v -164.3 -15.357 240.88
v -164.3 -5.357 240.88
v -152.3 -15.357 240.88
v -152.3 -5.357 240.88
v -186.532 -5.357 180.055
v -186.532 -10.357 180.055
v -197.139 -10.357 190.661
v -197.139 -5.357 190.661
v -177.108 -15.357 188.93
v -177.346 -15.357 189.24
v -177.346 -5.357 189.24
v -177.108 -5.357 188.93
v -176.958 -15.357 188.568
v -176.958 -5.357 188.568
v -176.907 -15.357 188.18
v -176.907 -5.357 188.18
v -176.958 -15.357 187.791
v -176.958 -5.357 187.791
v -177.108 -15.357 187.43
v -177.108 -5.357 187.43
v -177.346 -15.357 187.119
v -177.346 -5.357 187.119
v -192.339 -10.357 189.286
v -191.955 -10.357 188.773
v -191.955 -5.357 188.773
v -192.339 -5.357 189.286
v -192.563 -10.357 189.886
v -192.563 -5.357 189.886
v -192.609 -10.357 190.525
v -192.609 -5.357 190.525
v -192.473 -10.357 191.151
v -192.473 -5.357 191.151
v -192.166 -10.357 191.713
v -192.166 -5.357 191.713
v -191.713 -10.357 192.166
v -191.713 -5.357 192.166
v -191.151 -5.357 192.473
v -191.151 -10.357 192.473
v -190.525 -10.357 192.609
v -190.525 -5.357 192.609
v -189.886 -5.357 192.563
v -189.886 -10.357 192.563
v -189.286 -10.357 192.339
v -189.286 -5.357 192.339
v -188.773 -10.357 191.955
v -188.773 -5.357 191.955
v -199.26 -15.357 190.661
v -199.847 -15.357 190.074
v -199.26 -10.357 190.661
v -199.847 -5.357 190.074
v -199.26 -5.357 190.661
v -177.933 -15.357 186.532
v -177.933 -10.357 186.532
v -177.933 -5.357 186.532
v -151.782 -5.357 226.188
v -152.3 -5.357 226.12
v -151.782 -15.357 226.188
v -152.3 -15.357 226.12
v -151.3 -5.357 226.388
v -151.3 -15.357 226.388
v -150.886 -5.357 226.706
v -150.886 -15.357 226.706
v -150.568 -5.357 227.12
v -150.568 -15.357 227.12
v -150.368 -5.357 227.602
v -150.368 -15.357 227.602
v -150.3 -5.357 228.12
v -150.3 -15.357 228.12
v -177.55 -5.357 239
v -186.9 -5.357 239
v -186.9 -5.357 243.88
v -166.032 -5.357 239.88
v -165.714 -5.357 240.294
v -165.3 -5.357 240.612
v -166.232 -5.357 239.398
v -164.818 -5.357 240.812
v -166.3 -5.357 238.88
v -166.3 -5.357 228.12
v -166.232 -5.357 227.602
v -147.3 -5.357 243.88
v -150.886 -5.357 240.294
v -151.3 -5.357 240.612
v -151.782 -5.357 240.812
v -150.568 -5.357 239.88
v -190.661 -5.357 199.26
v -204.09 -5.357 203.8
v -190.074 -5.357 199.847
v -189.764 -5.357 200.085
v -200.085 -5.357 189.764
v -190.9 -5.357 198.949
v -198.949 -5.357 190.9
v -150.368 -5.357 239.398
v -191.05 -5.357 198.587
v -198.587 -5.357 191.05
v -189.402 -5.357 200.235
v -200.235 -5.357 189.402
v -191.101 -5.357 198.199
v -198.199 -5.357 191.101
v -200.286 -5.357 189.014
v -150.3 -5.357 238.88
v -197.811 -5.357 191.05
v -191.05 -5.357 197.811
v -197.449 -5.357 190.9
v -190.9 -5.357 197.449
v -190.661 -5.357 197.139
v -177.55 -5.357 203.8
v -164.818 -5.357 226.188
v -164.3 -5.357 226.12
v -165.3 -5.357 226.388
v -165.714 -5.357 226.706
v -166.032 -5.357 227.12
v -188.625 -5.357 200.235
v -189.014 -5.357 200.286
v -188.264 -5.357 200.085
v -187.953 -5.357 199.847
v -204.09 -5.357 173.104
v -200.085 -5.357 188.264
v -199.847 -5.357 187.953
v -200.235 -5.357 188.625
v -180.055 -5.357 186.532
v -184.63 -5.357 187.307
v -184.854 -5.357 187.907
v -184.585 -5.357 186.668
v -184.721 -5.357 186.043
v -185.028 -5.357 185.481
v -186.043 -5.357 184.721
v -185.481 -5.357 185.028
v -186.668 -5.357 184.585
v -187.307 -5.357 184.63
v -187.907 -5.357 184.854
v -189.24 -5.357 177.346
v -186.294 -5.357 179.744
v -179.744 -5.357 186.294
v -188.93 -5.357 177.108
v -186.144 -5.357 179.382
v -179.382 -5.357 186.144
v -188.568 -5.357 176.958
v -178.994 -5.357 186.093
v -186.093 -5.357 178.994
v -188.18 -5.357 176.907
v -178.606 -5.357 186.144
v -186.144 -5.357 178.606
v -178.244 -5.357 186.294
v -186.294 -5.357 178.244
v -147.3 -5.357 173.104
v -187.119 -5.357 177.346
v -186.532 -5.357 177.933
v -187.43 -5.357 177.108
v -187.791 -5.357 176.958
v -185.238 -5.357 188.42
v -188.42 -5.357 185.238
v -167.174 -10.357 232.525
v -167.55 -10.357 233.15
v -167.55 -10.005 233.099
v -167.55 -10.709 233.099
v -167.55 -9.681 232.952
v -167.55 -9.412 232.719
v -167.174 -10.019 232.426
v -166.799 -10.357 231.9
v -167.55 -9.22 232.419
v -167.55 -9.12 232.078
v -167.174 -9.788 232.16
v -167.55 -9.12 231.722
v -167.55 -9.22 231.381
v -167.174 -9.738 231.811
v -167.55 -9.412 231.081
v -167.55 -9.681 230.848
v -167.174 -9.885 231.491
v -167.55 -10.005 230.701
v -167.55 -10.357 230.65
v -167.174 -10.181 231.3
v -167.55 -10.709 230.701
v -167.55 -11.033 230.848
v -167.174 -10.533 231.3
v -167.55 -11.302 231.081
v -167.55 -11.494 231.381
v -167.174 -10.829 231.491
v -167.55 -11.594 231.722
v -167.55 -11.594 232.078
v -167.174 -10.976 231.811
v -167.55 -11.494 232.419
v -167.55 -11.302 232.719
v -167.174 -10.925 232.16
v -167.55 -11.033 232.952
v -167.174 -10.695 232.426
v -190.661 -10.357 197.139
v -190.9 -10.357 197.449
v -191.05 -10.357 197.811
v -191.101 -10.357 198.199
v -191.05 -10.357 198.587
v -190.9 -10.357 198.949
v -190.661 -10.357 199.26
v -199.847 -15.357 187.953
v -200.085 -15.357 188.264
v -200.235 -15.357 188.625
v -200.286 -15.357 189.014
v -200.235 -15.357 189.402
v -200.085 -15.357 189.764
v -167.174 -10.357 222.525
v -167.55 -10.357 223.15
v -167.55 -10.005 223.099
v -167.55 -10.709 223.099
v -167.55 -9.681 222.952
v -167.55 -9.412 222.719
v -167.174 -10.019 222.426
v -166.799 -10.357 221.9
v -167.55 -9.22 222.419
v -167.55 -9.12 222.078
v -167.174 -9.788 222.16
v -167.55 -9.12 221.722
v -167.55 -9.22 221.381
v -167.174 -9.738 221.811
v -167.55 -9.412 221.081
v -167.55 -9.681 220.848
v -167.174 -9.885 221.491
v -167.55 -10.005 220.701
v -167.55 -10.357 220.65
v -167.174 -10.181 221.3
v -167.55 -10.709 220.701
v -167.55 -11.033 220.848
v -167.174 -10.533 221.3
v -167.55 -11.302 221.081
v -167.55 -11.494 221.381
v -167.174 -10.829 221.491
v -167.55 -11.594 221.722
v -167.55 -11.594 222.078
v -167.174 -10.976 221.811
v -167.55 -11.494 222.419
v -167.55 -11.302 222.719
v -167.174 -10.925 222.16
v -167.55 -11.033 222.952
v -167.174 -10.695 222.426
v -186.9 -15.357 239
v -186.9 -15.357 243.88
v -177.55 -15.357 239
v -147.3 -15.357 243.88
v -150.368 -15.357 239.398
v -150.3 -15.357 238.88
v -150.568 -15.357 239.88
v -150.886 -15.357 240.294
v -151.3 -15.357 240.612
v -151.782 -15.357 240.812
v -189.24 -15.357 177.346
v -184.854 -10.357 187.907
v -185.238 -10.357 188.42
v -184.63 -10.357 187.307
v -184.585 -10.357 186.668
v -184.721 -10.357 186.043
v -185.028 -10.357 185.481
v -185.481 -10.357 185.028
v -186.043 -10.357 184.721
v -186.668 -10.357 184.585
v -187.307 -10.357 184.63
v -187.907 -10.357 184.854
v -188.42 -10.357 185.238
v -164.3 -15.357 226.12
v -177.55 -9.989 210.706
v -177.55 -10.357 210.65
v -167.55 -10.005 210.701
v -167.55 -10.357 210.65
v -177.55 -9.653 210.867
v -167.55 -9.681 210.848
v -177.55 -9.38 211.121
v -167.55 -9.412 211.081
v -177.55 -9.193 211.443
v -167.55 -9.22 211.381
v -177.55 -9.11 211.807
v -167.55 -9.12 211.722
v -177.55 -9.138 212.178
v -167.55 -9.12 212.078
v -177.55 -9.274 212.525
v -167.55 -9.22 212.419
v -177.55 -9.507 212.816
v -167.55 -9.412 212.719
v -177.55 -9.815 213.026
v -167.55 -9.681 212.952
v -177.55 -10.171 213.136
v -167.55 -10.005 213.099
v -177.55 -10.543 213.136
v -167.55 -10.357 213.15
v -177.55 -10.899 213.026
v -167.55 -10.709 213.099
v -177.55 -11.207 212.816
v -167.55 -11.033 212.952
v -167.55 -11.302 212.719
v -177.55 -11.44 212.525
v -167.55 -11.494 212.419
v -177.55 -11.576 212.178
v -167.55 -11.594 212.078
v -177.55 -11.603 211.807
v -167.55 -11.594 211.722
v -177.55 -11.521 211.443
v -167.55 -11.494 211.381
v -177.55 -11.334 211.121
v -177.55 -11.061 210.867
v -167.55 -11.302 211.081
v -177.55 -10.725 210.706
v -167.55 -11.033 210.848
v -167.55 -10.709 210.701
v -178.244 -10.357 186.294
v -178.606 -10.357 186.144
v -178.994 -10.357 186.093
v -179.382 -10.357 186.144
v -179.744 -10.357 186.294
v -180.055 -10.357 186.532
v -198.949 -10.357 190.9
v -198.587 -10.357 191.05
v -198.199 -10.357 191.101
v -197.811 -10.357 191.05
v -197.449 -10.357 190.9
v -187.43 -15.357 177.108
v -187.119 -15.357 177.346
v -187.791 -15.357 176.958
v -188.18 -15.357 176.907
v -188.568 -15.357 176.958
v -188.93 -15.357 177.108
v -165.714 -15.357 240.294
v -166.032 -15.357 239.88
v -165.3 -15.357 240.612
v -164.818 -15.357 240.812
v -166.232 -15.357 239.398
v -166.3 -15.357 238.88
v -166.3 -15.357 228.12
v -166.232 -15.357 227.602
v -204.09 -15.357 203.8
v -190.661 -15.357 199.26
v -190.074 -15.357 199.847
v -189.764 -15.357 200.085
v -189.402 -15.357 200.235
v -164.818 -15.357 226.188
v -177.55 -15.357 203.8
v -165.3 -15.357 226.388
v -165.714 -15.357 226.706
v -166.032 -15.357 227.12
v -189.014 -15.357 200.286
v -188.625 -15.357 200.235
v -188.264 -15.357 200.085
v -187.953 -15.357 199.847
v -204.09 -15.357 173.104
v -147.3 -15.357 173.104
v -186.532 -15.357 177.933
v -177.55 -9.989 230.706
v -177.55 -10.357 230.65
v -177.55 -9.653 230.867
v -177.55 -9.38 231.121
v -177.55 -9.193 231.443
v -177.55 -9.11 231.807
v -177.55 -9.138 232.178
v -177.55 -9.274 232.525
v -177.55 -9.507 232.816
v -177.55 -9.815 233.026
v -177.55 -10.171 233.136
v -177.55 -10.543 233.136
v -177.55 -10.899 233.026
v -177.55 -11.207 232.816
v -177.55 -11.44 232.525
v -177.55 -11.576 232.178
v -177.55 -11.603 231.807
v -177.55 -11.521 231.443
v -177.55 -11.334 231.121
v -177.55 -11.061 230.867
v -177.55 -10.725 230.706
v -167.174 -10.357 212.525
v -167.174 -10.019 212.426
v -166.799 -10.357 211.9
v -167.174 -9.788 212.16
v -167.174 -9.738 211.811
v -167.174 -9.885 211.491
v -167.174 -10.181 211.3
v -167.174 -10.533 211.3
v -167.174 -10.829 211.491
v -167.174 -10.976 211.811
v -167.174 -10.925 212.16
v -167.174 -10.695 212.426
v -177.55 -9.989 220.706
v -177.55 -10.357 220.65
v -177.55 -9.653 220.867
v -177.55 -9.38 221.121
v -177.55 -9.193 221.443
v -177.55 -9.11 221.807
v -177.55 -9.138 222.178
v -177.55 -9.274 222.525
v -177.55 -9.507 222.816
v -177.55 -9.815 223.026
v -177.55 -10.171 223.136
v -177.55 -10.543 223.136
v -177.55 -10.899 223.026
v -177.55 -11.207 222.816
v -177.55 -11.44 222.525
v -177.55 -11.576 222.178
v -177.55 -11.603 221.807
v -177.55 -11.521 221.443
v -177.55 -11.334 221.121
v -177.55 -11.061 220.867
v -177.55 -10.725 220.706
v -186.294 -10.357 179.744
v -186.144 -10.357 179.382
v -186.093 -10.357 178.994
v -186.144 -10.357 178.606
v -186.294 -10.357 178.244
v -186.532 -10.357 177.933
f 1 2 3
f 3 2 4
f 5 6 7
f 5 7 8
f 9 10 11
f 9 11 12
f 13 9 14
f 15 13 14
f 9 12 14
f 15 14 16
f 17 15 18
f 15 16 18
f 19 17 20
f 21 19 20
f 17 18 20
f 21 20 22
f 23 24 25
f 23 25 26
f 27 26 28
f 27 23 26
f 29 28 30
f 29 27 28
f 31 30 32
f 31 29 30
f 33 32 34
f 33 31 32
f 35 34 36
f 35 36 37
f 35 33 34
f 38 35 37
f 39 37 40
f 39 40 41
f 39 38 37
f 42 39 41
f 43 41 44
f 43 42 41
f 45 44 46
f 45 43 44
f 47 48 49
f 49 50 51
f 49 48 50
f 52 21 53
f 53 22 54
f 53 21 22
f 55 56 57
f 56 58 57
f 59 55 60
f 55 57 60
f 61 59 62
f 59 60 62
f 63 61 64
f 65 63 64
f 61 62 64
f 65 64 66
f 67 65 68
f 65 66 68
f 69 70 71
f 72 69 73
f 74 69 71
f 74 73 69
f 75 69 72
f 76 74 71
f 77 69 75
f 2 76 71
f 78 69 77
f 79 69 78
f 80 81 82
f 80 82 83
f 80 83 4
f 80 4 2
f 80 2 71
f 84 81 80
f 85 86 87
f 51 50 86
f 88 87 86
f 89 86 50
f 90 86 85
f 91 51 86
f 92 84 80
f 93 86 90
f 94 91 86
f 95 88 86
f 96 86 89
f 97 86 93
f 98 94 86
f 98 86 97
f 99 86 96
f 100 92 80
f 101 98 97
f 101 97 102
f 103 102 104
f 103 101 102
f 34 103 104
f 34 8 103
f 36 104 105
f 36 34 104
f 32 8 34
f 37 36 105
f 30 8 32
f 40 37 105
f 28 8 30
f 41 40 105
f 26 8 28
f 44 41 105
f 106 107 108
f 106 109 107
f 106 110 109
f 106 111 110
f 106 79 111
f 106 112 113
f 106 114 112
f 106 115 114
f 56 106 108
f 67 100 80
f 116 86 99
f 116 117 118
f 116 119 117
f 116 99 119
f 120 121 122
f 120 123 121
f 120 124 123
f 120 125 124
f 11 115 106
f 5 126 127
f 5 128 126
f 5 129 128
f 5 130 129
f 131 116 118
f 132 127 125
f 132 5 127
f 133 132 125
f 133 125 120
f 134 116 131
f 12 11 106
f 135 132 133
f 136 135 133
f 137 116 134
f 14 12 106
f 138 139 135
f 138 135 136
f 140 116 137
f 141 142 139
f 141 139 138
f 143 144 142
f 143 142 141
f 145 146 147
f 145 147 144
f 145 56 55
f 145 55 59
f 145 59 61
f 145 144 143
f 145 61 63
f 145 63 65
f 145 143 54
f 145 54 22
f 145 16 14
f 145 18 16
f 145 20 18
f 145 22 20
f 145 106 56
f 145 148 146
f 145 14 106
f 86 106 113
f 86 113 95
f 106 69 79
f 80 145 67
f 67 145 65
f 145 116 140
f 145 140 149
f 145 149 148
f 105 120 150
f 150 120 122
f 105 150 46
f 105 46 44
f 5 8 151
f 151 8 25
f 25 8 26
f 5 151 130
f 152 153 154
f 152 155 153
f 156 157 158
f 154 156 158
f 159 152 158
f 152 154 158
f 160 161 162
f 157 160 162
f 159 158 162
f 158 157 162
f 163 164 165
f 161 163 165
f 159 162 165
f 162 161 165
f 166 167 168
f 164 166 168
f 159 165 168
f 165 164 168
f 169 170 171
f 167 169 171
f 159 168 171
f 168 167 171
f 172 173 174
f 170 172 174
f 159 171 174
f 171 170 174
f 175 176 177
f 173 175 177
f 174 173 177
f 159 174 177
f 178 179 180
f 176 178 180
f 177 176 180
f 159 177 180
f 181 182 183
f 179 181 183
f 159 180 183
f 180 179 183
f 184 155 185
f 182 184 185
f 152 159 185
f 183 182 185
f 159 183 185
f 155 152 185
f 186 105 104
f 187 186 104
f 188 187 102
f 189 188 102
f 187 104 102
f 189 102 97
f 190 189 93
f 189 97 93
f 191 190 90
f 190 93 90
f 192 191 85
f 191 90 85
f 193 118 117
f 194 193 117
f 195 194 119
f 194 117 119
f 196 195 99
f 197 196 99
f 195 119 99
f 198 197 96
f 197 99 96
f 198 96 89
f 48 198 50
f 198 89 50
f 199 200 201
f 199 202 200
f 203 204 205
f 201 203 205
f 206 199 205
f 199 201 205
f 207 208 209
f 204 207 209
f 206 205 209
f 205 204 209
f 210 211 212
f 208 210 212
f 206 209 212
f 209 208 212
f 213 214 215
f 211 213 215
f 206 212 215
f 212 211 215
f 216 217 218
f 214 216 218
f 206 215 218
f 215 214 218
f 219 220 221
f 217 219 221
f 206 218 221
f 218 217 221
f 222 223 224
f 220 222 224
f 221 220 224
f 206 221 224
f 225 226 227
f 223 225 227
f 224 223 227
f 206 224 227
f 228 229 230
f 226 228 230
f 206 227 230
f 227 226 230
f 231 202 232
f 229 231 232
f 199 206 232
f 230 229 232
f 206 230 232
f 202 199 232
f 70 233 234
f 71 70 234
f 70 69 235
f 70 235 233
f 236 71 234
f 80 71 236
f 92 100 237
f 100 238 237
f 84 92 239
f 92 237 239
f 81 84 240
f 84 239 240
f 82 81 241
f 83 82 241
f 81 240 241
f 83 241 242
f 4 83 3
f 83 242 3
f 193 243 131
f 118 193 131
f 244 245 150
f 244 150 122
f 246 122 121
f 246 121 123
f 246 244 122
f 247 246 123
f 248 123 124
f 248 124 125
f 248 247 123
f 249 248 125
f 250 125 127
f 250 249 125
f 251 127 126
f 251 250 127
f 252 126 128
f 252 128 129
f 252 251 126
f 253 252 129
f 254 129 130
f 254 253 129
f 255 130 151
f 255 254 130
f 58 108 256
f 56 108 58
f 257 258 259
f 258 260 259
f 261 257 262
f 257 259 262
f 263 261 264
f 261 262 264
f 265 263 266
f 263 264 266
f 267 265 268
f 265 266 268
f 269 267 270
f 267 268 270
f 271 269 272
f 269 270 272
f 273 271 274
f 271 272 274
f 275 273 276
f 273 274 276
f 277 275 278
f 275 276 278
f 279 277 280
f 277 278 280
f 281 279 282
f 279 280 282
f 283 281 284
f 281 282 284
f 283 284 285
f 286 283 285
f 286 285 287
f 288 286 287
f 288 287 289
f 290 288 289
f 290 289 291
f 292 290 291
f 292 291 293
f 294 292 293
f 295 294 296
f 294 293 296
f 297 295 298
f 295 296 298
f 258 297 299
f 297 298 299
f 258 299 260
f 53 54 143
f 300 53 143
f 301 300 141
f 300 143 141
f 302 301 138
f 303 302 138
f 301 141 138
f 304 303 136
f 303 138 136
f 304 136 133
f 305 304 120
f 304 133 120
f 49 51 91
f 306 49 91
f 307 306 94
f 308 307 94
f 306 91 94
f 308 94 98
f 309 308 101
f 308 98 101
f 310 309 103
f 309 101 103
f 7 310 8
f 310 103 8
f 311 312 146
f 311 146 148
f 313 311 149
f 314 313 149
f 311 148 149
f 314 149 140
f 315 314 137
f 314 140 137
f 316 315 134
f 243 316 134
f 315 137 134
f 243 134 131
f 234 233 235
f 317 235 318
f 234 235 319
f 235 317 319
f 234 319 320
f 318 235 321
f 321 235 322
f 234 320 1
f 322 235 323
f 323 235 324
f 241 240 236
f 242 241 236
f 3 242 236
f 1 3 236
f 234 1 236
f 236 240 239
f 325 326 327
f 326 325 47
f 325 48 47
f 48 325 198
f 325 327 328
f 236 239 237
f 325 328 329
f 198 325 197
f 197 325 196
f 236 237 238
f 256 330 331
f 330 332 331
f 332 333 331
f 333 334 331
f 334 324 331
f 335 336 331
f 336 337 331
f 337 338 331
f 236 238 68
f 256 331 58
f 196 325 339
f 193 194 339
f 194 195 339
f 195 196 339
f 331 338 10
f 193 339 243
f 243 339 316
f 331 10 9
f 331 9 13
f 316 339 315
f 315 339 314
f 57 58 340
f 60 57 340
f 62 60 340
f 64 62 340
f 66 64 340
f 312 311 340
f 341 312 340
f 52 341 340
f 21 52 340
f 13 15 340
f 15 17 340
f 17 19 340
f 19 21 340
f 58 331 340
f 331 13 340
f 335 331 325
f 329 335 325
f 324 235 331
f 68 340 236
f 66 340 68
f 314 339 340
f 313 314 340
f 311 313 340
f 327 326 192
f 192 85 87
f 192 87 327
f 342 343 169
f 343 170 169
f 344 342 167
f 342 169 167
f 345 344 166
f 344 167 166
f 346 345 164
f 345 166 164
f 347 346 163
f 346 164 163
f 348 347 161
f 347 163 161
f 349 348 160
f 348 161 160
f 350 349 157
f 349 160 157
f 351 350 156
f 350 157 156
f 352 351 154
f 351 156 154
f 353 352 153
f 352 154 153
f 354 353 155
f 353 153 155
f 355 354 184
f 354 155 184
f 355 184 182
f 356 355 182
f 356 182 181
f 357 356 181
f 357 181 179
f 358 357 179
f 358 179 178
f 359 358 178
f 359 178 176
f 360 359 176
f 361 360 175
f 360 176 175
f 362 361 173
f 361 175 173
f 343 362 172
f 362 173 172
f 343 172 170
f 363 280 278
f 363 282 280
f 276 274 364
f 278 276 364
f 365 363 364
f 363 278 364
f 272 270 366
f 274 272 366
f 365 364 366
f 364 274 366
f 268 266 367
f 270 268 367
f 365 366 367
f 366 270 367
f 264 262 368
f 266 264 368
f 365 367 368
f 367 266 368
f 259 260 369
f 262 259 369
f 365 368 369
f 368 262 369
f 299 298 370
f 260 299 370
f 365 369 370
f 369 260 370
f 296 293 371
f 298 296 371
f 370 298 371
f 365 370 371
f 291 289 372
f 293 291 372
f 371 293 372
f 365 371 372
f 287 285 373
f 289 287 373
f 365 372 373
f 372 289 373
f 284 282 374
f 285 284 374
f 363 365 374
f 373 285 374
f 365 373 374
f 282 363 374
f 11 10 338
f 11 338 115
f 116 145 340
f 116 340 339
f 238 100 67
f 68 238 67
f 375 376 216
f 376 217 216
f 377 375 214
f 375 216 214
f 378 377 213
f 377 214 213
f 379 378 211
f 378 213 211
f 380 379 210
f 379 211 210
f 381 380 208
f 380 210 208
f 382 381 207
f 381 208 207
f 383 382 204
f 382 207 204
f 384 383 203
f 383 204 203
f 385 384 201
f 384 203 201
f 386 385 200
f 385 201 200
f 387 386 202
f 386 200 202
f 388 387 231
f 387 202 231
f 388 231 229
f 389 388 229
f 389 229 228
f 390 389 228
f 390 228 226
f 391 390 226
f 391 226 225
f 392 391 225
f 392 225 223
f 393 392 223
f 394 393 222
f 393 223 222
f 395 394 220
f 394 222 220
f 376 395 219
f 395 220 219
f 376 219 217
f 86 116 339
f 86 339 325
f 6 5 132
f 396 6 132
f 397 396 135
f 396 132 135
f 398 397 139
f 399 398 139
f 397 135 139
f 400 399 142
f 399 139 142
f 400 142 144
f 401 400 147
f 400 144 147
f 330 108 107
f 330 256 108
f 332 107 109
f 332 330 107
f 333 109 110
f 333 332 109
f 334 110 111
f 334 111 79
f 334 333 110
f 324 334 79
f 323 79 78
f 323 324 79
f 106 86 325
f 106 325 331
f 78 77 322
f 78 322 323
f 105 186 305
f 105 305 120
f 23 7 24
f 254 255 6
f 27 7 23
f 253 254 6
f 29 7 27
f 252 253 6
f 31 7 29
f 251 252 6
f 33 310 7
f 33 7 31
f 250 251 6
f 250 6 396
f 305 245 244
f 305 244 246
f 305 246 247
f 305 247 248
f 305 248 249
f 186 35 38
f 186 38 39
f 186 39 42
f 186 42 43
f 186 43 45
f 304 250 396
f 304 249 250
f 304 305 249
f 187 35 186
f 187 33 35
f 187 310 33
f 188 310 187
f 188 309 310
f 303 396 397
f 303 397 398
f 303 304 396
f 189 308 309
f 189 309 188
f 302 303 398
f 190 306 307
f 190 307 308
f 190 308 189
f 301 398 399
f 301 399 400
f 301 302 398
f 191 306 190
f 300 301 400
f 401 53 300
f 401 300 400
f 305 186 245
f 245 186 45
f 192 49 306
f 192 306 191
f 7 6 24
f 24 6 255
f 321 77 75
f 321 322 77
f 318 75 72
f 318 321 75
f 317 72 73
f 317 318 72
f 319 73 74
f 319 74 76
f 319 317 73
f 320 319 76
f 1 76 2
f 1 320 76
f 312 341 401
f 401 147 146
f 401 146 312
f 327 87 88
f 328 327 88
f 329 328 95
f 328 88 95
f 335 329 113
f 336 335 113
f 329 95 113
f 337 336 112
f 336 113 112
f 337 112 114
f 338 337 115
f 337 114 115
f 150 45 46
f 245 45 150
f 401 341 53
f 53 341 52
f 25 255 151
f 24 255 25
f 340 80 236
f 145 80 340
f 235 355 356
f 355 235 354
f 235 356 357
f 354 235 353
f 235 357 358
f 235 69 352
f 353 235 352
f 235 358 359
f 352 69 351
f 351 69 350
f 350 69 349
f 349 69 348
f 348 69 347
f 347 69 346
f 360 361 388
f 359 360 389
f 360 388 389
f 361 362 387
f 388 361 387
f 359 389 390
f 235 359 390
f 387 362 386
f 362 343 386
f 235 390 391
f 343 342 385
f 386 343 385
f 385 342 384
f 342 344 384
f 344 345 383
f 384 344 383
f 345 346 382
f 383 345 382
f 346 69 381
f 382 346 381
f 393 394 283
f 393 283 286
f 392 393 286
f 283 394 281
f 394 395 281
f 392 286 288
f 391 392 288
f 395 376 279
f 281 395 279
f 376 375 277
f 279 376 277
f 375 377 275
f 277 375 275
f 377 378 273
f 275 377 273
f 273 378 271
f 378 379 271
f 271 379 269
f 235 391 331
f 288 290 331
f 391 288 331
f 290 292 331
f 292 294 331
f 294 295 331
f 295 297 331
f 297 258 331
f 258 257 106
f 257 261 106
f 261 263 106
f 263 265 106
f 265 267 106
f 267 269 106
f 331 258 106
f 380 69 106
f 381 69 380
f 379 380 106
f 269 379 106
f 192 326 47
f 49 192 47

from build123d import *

# Parameters (mm, degrees)
SKETCH3_W                       = 3
SKETCH3_H                       = 10
BOSS_EXTRUDE1_DEPTH             = 15
SKETCH3_W_2                     = 9.160158842
BOSS_EXTRUDE1_2_DEPTH           = 15
BOSS_EXTRUDE1_3_DEPTH           = 15
SKETCH4_W                       = 22.820603272
SKETCH4_H                       = 10
BOSS_EXTRUDE2_DEPTH             = 3
SKETCH5_W                       = 22.820603272
SKETCH5_H                       = 10
BOSS_EXTRUDE3_DEPTH             = 3
SKETCH7_W                       = 16
SKETCH7_H                       = 14.76
BOSS_EXTRUDE4_DEPTH             = 10
SKETCH8_W                       = 6.35
SKETCH8_H                       = 35.2
CUT_EXTRUDE1_DEPTH              = 10
TAP_DRILL_FOR_M3X0_5_TAP1_D     = 2.5
TAP_DRILL_FOR_M3X0_5_TAP1_DEPTH = 10
TAP_DRILL_FOR_M3X0_5_TAP1_TIP   = 0.751075774
BOSS_EXTRUDE5_DEPTH             = 10
CUT_EXTRUDE4_DEPTH              = 319.166667347
CUT_EXTRUDE5_DEPTH              = 5
M4_START                        = -10.356969024
M4_CLEARANCE_SLOT1_DEPTH        = 5
FILLET4_R                       = 2


# Read off the part's stored shape, not the designer's step: M4 Clearance Slot1
with BuildPart() as part:
    # Sketch3 → Boss-Extrude1 (new body)
    with BuildSketch(Plane(origin=(-193.9, 0, 193.9), x_dir=(0.7071067811865475, 0, 0.7071067811865477), z_dir=(-0.7071067811865477, 0, 0.7071067811865475))):
        with Locations((-9.910301636, -10.356969024)):
            Rectangle(SKETCH3_W, SKETCH3_H)
    extrude(amount=-BOSS_EXTRUDE1_DEPTH)



with BuildPart() as body_2:
    # Sketch3 → Boss-Extrude1 2 (new body)
    with BuildSketch(Plane(origin=(-193.9, 0, 193.9), x_dir=(0.7071067811865475, 0, 0.7071067811865477), z_dir=(-0.7071067811865477, 0, 0.7071067811865475))):
        with Locations((0, -10.356969024)):
            Rectangle(SKETCH3_W_2, SKETCH3_H)
    extrude(amount=-BOSS_EXTRUDE1_2_DEPTH)


with BuildPart() as body_3:
    # Sketch3 → Boss-Extrude1 3 (new body)
    with BuildSketch(Plane(origin=(-193.9, 0, 193.9), x_dir=(0.7071067811865475, 0, 0.7071067811865477), z_dir=(-0.7071067811865477, 0, 0.7071067811865475))):
        with Locations((9.910301636, -10.356969024)):
            Rectangle(SKETCH3_W, SKETCH3_H)
    extrude(amount=-BOSS_EXTRUDE1_3_DEPTH)


with BuildPart() as part_1:
    add(part.part)

    add(body_2.part)  # Boss-Extrude2 merges body 2

    add(body_3.part)  # Boss-Extrude2 merges body 3
    # Sketch4 → Boss-Extrude2 (add)
    with BuildSketch(Plane(origin=(-193.9, 0, 193.9), x_dir=(0.7071067811865472, 0, 0.7071067811865479), z_dir=(-0.7071067811865479, 0, 0.7071067811865472))):
        with Locations((0, -10.356969024)):
            Rectangle(SKETCH4_W, SKETCH4_H)
    extrude(amount=BOSS_EXTRUDE2_DEPTH)

    # Sketch5 → Boss-Extrude3 (add)
    with BuildSketch(Plane(origin=(-183.293398282, 0, 183.293398282), x_dir=(-0.7071067811865472, 0, -0.7071067811865479), z_dir=(0.7071067811865479, 0, -0.7071067811865472))):
        with Locations((0, -10.356969024)):
            Rectangle(SKETCH5_W, SKETCH5_H)
    extrude(amount=BOSS_EXTRUDE3_DEPTH)

    # Sketch7 → Boss-Extrude4 (add)
    # profile 1 of 2: a face of its own
    with BuildSketch(Plane(origin=(0, -5.356969024, 0), x_dir=(1, 0, 0), z_dir=(0, 1, 0))):
        Polygon((-204.089622006, -203.8), (-188.242640687, -203.8), (-204.089622006, -187.953018681), align=None)
    # profile 2 of 2: a face of its own
    with BuildSketch(Plane(origin=(0, -5.356969024, 0), x_dir=(1, 0, 0), z_dir=(0, 1, 0))):
        Polygon((-183.9, -239), (-186.9, -239), (-186.9, -243.88), (-147.3, -243.88), (-147.3, -173.103776276), (-189.240379601, -173.103776276), (-173.103776276, -189.240379601), (-187.663396675, -203.8), (-183.9, -203.8), align=None)
        with Locations((-158.3, -233.5)):
            Rectangle(SKETCH7_W, SKETCH7_H, mode=Mode.SUBTRACT)
    extrude(amount=-BOSS_EXTRUDE4_DEPTH)

    # Sketch8 → Cut-Extrude1 (cut)
    with BuildSketch(Plane(origin=(0, -5.356969024, 0), x_dir=(1, 0, 0), z_dir=(0, 1, 0))):
        Polygon((-188.242640687, -203.8), (-187.953018681, -204.089622006), (-187.663396675, -203.8), align=None)
        with Locations((-180.725, -221.4)):
            Rectangle(SKETCH8_W, SKETCH8_H)
    extrude(amount=-CUT_EXTRUDE1_DEPTH, mode=Mode.SUBTRACT)

    # Tap Drill for M3x0.5 Tap1
    with Locations(Plane.ZY.offset(177.55)):
        with Locations((211.9, -10.356969024), (231.9, -10.356969024), (221.9, -10.356969024)):
            Hole(TAP_DRILL_FOR_M3X0_5_TAP1_D / 2, depth=TAP_DRILL_FOR_M3X0_5_TAP1_DEPTH)
            with Locations((0, 0, -(TAP_DRILL_FOR_M3X0_5_TAP1_DEPTH + TAP_DRILL_FOR_M3X0_5_TAP1_TIP / 2))):  # 118° drill point
                Cone(0, TAP_DRILL_FOR_M3X0_5_TAP1_D / 2, TAP_DRILL_FOR_M3X0_5_TAP1_TIP, mode=Mode.SUBTRACT)

    # Sketch13 → Boss-Extrude5 (add)
    with BuildSketch(Plane(origin=(0, -5.356969024, 0), x_dir=(1, 0, 0), z_dir=(0, 1, 0))):
        Polygon((-204.089622006, -173.103776276), (-204.089622006, -187.953018681), (-189.240379601, -173.103776276), align=None)
    extrude(amount=-BOSS_EXTRUDE5_DEPTH)

    # Sketch15 → Cut-Extrude4 (cut, through all)
    with BuildSketch(Plane(origin=(0, -5.356969024, 0), x_dir=(1, 0, 0), z_dir=(0, 1, 0))):
        with BuildLine():
            Line((-186.532003499, -177.933472722), (-187.119059257, -177.346416963))
            ThreePointArc((-187.119059257, -177.346416963), (-188.179719429, -176.907077135), (-189.240379601, -177.346416963))
            Line((-189.240379601, -177.346416963), (-199.846981319, -187.953018681))
            ThreePointArc((-199.846981319, -187.953018681), (-200.286321147, -189.013678853), (-199.846981319, -190.074339025))
            Line((-199.846981319, -190.074339025), (-199.25992556, -190.661394783))
            ThreePointArc((-199.25992556, -190.661394783), (-198.199265388, -191.100734612), (-197.138605217, -190.661394783))
            Line((-197.138605217, -190.661394783), (-186.532003499, -180.054793066))
            ThreePointArc((-186.532003499, -180.054793066), (-186.092663671, -178.994132894), (-186.532003499, -177.933472722))
        make_face()
        with BuildLine():
            Line((-177.346416963, -187.119059257), (-177.933472722, -186.532003499))
            ThreePointArc((-177.933472722, -186.532003499), (-178.994132894, -186.092663671), (-180.054793066, -186.532003499))
            Line((-180.054793066, -186.532003499), (-190.661394783, -197.138605217))
            ThreePointArc((-190.661394783, -197.138605217), (-191.100734612, -198.199265388), (-190.661394783, -199.25992556))
            Line((-190.661394783, -199.25992556), (-190.074339025, -199.846981319))
            ThreePointArc((-190.074339025, -199.846981319), (-189.013678853, -200.286321147), (-187.953018681, -199.846981319))
            Line((-187.953018681, -199.846981319), (-177.346416963, -189.240379601))
            ThreePointArc((-177.346416963, -189.240379601), (-176.907077135, -188.179719429), (-177.346416963, -187.119059257))
        make_face()
    extrude(amount=-CUT_EXTRUDE4_DEPTH, mode=Mode.SUBTRACT)

    # Sketch16 → Cut-Extrude5 (cut)
    with BuildSketch(Plane.XZ.offset(15.356969024)):
        Polygon((-187.119059257, 177.346416963), (-177.346416963, 187.119059257), (-190.074339025, 199.846981319), (-199.846981319, 190.074339025), align=None)
    extrude(amount=-CUT_EXTRUDE5_DEPTH, mode=Mode.SUBTRACT)

    # M4 Clearance Slot1 outline → M4 Clearance Slot1 (cut)
    with BuildSketch(Plane(origin=(0, 0, 0), x_dir=(1, 0, 0), z_dir=(0, 1, 0)).offset(M4_START)):
        with BuildLine():
            Line((-188.419922446, -185.23794193), (-191.955456352, -188.773475836))
            ThreePointArc((-191.955456352, -188.773475836), (-191.955456352, -191.955456352), (-188.773475836, -191.955456352))
            Line((-188.773475836, -191.955456352), (-185.23794193, -188.419922446))
            ThreePointArc((-185.23794193, -188.419922446), (-185.23794193, -185.23794193), (-188.419922446, -185.23794193))
        make_face()
    extrude(amount=M4_CLEARANCE_SLOT1_DEPTH, mode=Mode.SUBTRACT)

    # Fillet4
    fillet4_edges = [part_1.edges().sort_by_distance(p)[0] for p in [
        (-166.3, -10.356969024, 240.88),
        (-166.3, -10.356969024, 226.12),
        (-150.3, -10.356969024, 226.12),
        (-150.3, -10.356969024, 240.88),
    ]]
    fillet(fillet4_edges, radius=FILLET4_R)


solid = part_1.part
